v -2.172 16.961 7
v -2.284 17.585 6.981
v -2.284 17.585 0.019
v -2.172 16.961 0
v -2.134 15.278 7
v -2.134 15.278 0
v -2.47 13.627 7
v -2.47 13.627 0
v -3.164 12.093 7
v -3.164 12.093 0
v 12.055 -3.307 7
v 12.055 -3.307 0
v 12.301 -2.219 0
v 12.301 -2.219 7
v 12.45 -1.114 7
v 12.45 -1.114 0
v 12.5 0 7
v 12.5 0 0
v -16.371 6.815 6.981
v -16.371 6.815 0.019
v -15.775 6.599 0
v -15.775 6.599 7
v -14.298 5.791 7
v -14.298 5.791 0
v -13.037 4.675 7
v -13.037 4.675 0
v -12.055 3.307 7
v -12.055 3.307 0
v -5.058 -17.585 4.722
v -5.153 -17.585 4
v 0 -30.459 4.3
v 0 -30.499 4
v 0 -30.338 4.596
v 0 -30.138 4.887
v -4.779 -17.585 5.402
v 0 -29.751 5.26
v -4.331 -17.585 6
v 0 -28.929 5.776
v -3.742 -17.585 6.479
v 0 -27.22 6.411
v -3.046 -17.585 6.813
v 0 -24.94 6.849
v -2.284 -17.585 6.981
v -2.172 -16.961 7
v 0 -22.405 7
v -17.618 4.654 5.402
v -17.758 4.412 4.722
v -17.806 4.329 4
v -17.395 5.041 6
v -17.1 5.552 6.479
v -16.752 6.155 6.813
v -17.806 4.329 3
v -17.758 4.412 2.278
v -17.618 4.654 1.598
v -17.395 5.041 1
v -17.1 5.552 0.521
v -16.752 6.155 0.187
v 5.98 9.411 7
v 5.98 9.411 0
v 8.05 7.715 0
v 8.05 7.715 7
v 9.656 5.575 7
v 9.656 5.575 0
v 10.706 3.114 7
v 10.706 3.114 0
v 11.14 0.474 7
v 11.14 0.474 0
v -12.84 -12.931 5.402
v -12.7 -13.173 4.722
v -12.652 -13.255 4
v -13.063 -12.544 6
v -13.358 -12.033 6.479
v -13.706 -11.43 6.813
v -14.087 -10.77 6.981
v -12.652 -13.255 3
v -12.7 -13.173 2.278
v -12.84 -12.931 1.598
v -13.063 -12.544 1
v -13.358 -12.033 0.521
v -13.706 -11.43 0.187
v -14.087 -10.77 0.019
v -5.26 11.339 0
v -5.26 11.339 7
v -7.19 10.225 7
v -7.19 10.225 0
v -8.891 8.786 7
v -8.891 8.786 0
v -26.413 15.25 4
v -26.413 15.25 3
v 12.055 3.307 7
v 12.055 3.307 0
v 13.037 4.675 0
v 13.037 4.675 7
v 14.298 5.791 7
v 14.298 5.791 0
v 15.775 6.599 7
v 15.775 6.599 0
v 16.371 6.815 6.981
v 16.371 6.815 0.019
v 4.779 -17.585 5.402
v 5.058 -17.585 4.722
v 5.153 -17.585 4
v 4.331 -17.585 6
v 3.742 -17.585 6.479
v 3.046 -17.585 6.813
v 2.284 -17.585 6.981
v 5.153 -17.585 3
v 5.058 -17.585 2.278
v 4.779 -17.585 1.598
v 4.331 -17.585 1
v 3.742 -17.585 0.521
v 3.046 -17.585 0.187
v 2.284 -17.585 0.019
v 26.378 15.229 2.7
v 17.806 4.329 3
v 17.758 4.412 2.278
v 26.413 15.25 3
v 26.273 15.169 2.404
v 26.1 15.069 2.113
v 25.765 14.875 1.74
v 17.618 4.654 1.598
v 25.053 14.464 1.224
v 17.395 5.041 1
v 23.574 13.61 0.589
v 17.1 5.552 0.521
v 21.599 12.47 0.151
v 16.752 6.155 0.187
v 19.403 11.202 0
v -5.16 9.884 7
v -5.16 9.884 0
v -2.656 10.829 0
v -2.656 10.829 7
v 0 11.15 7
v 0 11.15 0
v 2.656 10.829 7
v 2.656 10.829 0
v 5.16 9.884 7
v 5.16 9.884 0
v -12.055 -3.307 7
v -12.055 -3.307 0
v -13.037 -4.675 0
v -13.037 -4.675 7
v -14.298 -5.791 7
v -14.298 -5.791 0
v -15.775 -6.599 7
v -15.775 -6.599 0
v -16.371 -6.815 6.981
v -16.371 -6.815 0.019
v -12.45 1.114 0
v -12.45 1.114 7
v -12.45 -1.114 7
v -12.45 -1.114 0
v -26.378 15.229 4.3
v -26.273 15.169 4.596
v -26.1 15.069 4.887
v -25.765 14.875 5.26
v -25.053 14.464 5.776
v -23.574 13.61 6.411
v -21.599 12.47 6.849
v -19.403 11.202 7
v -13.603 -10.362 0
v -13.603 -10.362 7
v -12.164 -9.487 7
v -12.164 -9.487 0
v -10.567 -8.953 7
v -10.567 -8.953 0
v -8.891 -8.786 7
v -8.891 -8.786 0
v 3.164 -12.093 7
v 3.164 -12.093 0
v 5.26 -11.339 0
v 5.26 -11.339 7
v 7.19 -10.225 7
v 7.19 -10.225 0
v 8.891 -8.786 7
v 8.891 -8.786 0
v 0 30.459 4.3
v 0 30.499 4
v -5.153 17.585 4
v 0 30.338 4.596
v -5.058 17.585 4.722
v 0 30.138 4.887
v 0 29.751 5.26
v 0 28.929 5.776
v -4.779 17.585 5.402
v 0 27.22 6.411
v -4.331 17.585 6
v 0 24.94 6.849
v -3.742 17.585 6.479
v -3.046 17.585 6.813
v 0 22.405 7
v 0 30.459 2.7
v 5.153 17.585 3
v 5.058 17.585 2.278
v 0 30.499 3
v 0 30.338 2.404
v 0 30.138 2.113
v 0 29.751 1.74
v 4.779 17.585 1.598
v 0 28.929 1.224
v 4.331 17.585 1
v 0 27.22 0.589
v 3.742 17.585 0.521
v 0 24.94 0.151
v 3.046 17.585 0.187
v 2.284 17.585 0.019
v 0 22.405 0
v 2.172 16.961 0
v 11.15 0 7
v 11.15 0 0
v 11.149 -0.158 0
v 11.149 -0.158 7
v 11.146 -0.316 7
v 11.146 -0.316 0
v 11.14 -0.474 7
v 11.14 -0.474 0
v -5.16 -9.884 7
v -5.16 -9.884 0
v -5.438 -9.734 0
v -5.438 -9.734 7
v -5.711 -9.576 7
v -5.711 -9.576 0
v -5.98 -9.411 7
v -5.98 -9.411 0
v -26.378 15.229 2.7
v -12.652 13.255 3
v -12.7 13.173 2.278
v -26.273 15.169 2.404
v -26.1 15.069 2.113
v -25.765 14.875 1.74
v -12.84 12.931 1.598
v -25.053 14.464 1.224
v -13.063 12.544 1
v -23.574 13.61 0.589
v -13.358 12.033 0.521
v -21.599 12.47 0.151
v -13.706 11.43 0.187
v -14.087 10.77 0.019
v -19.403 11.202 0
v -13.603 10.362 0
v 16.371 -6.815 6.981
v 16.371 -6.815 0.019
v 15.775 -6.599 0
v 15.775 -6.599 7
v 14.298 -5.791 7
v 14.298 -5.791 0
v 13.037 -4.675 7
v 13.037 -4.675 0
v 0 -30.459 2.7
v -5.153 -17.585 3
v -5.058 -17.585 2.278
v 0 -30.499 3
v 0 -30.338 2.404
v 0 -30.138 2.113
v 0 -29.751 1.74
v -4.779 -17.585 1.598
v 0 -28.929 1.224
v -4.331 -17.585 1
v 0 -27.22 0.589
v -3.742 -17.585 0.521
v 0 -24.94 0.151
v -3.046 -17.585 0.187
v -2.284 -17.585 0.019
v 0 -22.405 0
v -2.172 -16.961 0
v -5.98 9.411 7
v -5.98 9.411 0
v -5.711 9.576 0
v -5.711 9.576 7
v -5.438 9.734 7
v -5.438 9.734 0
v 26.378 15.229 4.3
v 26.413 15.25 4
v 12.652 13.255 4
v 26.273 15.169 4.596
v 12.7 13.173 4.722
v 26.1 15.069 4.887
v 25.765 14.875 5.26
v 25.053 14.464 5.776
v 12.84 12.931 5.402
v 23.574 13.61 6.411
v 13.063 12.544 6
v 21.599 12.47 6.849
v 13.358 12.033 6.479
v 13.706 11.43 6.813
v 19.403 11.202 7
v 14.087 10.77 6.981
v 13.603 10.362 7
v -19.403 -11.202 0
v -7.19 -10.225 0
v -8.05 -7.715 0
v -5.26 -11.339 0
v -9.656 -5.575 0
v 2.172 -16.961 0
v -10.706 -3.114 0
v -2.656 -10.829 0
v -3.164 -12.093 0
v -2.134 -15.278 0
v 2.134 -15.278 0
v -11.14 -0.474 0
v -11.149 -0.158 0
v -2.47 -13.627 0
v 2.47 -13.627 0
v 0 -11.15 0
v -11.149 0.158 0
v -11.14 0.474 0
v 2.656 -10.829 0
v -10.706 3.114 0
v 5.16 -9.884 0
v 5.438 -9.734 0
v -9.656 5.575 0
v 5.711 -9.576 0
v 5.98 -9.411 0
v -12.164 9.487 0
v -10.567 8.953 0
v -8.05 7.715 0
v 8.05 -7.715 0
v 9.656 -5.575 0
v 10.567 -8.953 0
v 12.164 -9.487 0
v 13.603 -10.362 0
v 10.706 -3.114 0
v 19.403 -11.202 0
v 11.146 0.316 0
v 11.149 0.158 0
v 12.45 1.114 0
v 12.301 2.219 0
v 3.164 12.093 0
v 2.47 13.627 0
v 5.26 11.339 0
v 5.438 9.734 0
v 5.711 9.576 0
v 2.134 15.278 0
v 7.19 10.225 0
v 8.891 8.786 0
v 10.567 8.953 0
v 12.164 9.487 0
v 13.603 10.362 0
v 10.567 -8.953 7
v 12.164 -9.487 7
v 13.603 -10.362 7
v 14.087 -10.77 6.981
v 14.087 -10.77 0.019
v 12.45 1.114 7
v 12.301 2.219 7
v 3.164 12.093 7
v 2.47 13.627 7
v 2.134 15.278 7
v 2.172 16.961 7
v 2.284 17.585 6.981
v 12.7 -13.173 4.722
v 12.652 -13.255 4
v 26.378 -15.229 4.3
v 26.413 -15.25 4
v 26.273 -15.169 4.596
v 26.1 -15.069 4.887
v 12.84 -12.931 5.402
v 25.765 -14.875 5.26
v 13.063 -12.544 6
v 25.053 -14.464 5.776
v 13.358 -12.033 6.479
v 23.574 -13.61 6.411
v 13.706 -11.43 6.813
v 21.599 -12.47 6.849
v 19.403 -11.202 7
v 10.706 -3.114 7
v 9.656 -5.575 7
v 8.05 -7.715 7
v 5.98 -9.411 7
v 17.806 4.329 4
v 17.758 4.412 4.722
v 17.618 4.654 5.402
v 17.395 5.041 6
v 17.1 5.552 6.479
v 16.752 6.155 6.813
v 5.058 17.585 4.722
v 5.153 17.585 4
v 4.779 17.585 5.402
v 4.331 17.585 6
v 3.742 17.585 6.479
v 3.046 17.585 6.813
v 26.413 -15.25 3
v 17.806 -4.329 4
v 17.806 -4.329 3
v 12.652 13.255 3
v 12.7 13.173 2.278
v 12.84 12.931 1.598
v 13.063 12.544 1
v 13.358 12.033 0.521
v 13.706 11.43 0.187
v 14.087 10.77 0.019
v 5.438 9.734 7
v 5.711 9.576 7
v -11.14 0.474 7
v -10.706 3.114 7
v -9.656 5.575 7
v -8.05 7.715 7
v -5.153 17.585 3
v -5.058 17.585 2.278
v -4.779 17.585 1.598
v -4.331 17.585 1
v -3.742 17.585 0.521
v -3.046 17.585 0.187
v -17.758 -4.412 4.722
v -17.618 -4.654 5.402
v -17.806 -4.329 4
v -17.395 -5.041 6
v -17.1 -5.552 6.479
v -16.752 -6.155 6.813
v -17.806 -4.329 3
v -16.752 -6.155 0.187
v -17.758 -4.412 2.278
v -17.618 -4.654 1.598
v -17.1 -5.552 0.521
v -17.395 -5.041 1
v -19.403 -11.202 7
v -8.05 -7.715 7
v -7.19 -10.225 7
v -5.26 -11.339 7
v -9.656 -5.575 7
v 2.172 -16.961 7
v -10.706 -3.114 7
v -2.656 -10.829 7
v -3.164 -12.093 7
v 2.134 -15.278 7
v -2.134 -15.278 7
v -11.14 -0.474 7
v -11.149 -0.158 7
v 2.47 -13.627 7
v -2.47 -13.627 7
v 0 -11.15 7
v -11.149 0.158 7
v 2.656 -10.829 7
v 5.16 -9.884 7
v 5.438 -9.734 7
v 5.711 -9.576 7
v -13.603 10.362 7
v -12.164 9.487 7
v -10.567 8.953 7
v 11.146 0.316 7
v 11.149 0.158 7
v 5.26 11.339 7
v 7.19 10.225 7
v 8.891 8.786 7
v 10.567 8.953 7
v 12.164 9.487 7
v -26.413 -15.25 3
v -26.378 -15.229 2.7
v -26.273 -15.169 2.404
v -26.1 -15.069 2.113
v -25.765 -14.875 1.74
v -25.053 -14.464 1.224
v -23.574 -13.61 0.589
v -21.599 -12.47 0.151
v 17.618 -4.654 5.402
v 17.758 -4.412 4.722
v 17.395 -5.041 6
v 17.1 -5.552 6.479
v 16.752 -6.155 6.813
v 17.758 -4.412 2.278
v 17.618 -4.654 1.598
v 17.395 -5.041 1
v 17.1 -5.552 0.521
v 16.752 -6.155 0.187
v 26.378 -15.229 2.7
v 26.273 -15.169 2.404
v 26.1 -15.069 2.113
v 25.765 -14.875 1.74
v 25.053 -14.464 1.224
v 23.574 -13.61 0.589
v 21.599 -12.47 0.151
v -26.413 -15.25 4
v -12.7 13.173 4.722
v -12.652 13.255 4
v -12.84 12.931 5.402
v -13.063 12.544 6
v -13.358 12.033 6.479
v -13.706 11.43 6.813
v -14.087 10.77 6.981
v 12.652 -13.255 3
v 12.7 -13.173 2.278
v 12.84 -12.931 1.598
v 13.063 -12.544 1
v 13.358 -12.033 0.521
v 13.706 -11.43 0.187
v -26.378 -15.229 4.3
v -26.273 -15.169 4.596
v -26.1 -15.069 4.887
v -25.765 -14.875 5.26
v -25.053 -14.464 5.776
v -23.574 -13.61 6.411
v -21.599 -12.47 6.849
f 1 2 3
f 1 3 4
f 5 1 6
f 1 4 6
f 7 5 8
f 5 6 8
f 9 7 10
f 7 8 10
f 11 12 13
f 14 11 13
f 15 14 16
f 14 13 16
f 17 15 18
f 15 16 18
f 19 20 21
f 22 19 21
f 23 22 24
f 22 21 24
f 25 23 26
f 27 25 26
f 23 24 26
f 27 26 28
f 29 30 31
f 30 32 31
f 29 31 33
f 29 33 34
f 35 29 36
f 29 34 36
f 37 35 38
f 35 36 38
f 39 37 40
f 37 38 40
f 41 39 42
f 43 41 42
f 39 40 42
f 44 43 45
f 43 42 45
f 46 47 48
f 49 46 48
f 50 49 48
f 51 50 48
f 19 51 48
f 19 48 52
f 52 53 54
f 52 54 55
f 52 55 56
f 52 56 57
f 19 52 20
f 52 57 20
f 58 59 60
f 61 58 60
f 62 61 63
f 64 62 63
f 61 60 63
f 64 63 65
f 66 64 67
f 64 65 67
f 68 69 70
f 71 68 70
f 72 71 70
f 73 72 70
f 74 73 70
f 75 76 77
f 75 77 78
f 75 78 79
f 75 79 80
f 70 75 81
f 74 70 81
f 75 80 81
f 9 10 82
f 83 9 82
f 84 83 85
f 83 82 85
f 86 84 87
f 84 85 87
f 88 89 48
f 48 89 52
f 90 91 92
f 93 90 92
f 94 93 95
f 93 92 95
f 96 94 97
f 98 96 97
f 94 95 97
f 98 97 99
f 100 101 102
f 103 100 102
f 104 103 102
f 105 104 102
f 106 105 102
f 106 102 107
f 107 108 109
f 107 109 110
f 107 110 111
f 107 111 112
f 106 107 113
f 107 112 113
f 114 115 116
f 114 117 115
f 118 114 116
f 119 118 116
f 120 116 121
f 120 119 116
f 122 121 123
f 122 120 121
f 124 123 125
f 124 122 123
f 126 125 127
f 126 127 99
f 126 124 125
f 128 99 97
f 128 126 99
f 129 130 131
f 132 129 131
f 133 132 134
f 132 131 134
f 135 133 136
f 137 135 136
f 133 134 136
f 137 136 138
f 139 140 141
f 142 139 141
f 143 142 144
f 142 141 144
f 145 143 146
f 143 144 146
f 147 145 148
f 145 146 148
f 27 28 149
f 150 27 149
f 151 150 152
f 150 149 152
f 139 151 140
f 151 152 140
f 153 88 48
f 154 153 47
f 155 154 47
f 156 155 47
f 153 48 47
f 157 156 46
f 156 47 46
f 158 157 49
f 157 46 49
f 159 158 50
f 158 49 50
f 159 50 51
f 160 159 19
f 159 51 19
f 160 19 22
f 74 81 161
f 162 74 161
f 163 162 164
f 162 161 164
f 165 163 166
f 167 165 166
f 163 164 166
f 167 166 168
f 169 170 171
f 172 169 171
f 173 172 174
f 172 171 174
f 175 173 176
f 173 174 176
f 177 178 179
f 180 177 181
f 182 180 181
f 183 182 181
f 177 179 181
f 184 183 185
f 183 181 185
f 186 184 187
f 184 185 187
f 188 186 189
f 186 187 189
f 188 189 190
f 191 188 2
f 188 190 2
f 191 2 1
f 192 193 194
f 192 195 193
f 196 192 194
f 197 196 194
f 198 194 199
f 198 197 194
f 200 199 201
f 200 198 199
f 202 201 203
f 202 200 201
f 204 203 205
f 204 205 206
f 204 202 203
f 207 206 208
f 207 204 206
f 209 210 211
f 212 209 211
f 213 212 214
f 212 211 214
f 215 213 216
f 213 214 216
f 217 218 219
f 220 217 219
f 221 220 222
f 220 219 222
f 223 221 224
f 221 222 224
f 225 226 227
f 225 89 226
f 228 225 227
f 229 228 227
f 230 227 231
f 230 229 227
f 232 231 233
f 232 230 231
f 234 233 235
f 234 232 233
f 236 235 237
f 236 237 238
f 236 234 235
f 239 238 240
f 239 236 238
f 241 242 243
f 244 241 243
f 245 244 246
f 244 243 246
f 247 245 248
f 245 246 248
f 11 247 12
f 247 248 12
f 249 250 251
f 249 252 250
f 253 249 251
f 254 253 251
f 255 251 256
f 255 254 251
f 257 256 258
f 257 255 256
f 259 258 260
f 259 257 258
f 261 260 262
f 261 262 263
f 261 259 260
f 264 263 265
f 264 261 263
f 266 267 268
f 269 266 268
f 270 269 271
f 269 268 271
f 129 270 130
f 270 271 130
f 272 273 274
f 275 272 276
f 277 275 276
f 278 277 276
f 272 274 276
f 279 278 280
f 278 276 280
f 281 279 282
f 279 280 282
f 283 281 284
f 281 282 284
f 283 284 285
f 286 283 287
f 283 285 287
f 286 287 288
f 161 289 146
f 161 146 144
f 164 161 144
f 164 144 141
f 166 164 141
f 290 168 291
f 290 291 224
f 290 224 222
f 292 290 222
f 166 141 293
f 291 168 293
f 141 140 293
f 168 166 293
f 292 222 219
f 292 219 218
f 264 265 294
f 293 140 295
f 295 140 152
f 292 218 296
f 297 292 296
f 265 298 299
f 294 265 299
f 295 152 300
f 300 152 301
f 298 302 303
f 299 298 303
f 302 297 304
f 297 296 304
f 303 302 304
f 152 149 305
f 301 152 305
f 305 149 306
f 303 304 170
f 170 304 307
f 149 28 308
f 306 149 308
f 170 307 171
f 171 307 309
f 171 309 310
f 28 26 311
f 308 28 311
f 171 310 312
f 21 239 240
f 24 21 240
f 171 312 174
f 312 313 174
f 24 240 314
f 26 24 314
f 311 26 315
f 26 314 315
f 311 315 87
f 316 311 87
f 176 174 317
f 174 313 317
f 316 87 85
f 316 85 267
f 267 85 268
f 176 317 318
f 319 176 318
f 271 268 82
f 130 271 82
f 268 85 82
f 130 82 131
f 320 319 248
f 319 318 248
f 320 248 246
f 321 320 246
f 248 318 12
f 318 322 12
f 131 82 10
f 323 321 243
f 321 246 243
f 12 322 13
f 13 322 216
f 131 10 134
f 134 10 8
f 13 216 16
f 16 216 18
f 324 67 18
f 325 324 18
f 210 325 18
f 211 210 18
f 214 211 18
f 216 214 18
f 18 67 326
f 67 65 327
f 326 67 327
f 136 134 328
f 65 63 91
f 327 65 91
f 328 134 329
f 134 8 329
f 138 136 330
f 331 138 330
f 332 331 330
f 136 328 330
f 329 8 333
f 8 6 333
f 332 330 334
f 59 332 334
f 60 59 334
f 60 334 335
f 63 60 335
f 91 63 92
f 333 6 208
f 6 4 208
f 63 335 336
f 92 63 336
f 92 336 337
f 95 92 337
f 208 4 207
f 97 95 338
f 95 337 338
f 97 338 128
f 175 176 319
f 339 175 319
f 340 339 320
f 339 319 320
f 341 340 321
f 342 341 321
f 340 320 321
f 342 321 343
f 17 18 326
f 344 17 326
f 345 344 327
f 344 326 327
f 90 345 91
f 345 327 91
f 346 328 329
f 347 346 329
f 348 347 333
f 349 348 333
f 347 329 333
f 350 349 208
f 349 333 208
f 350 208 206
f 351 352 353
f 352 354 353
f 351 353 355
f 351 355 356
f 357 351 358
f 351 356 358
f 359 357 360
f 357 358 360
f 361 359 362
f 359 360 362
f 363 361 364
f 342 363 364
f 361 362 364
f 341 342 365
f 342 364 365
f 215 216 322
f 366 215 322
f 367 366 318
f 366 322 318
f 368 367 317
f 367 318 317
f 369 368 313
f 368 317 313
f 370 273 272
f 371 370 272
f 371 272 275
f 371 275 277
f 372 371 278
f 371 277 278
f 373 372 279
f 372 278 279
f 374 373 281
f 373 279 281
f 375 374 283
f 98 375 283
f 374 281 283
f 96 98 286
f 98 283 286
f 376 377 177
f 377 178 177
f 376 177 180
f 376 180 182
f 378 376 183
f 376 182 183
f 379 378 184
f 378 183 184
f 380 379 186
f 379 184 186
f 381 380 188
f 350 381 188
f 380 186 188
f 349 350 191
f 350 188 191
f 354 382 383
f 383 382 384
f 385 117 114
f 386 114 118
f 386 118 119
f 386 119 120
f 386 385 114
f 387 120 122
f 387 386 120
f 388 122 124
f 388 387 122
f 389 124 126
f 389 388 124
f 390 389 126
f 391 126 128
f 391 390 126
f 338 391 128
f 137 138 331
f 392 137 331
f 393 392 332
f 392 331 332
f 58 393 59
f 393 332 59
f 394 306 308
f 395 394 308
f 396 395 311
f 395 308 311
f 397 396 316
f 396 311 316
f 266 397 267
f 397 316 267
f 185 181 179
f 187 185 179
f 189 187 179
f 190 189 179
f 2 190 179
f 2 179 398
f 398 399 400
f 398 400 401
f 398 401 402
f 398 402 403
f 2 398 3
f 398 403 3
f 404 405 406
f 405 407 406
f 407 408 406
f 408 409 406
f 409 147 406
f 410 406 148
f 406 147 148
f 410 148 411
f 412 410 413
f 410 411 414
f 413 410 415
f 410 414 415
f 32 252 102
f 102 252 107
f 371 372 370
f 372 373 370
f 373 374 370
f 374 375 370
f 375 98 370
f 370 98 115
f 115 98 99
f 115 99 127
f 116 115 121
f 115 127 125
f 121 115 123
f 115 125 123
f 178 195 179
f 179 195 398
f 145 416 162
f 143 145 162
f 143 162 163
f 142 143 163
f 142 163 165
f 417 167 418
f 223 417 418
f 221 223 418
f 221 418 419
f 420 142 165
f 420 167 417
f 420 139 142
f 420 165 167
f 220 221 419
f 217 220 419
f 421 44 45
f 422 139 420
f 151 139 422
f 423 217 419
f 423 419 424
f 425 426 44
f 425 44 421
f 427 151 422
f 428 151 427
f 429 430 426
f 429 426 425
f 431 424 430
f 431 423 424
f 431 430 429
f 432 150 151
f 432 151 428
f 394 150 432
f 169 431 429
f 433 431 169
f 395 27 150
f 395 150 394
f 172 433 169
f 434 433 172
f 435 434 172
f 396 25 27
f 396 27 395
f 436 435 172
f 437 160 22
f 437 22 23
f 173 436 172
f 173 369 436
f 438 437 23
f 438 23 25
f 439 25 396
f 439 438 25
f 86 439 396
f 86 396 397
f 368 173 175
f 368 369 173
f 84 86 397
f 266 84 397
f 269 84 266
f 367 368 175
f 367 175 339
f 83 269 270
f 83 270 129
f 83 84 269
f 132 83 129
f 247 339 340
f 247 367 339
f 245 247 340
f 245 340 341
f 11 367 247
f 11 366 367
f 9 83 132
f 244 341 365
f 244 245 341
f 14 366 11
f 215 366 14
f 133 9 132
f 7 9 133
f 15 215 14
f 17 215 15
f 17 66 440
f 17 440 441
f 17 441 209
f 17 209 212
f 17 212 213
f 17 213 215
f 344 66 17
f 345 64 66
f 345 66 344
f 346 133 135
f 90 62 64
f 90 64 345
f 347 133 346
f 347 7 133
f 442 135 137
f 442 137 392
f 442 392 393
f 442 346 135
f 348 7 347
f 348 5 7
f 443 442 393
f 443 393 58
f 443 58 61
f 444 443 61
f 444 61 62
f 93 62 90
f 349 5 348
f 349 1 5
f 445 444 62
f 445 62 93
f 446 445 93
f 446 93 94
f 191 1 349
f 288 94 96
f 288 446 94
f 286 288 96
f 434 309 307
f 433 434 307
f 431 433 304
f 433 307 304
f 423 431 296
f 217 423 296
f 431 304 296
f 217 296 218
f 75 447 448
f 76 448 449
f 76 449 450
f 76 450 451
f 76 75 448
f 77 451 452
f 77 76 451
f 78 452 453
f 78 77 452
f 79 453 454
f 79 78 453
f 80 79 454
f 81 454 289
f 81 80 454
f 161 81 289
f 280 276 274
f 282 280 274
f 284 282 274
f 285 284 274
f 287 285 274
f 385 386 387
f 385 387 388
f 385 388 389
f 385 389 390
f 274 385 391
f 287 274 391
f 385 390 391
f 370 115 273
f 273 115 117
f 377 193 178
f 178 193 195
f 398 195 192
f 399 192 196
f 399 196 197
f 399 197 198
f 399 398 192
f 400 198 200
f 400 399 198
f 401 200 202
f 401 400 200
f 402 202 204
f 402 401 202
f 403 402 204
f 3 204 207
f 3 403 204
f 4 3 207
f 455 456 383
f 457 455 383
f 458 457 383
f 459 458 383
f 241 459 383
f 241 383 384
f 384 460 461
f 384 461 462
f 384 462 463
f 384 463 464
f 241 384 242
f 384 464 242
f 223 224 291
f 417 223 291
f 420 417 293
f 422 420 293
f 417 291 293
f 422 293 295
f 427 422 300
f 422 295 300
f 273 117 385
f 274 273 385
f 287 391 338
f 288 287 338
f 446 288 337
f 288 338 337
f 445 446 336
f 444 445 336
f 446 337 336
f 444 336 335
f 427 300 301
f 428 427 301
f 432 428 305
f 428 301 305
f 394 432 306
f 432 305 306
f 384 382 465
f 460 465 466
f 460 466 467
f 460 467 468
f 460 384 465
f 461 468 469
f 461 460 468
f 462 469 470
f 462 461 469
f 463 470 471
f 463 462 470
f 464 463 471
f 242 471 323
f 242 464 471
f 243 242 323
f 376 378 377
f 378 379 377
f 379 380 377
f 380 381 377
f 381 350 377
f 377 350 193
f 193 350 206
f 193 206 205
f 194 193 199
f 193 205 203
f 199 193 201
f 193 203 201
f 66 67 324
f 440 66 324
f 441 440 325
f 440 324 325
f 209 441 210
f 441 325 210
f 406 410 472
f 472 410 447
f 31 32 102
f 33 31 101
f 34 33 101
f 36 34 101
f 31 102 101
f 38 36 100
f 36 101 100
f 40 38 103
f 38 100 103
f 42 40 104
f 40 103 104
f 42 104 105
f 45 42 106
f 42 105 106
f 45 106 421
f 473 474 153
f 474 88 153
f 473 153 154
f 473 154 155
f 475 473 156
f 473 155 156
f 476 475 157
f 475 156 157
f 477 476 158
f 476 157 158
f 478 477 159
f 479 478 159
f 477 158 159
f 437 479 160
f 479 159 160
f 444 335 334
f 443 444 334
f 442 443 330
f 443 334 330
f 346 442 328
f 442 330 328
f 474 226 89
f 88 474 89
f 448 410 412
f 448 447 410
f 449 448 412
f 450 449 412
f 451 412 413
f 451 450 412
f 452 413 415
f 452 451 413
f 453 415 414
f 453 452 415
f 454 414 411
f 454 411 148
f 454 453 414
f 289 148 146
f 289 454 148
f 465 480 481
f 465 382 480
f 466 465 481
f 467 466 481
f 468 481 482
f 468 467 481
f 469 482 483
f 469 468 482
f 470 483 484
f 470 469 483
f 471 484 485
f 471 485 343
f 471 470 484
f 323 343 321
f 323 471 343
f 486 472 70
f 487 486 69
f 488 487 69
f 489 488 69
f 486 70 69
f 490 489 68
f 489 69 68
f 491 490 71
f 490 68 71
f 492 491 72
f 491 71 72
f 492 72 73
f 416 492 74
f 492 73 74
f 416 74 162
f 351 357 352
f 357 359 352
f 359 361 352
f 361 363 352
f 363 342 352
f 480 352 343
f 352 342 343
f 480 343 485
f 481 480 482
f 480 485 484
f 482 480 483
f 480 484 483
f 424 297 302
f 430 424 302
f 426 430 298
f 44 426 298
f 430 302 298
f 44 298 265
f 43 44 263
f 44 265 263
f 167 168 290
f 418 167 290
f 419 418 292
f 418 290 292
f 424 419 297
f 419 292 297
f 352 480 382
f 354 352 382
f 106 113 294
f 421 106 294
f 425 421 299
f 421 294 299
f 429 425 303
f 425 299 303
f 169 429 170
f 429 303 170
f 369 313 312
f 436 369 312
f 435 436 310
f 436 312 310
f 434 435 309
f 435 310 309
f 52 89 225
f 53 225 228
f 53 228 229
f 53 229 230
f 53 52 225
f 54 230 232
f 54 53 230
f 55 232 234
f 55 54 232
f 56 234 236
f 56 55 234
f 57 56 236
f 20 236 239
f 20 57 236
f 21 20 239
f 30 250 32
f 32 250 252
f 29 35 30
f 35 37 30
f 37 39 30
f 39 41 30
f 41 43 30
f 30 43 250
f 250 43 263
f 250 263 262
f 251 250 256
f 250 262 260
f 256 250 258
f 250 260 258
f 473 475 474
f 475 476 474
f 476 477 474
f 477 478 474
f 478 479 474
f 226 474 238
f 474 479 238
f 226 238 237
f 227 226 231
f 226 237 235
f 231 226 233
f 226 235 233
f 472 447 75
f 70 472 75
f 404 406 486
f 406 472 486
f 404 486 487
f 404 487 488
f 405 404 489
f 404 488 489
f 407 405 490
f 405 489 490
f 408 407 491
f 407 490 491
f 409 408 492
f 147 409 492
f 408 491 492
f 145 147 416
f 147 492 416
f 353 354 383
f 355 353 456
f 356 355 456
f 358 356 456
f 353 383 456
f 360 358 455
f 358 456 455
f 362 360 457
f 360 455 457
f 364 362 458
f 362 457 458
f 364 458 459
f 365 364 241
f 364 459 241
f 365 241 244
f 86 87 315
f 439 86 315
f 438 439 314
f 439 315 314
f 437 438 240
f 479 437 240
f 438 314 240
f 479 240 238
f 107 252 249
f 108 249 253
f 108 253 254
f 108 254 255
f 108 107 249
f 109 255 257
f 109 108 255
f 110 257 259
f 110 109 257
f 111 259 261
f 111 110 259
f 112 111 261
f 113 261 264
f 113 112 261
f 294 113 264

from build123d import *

# Parameters (mm, degrees)
F1_DEPTH = 7
F2_R     = 3


with BuildPart() as f1:
    # F0 (on Top) → F1 (new body)
    with BuildSketch(Plane.XY):
        with BuildLine():
            ThreePointArc((11.139936974, 0.4736076595), (11.1474839596, 0.2368572775), (11.15, 0))
            ThreePointArc((11.15, 0), (11.1474839596, -0.2368572775), (11.139936974, -0.4736076595))
            ThreePointArc((11.139936974, -0.4736076595), (11.4562515521, -1.9356574125), (12.0547261732, -3.306595967))
            ThreePointArc((12.0547261732, -3.306595967), (12.3881814074, -1.6682210338), (12.5, 0))
            ThreePointArc((12.5, 0), (12.3881814074, 1.6682210338), (12.0547261732, 3.306595967))
            ThreePointArc((12.0547261732, 3.306595967), (11.4562515521, 1.9356574125), (11.139936974, 0.4736076595))
        make_face()
        with BuildLine():
            ThreePointArc((5.9801247516, 9.4106645863), (9.6561832522, 5.575), (11.139936974, 0.4736076595))
            ThreePointArc((11.139936974, 0.4736076595), (11.4562515521, 1.9356574125), (12.0547261732, 3.306595967))
            ThreePointArc((12.0547261732, 3.306595967), (10.8253175473, 6.25), (8.8909591941, 8.7864011181))
            ThreePointArc((8.8909591941, 8.7864011181), (7.4044542683, 8.9535761701), (5.9801247516, 9.4106645863))
        make_face()
        with BuildLine():
            ThreePointArc((12.0547261732, -3.306595967), (11.4562515521, -1.9356574125), (11.139936974, -0.4736076595))
            ThreePointArc((11.139936974, -0.4736076595), (9.6561832522, -5.575), (5.9801247516, -9.4106645863))
            ThreePointArc((5.9801247516, -9.4106645863), (7.4044542683, -8.9535761701), (8.8909591941, -8.7864011181))
            ThreePointArc((8.8909591941, -8.7864011181), (10.8253175473, -6.25), (12.0547261732, -3.306595967))
        make_face()
        with BuildLine():
            ThreePointArc((5.1598122224, 9.8842722458), (5.575, 9.6561832522), (5.9801247516, 9.4106645863))
            ThreePointArc((5.9801247516, 9.4106645863), (7.4044542683, 8.9535761701), (8.8909591941, 8.7864011181))
            ThreePointArc((8.8909591941, 8.7864011181), (6.25, 10.8253175473), (3.1637669791, 12.0929970852))
            ThreePointArc((3.1637669791, 12.0929970852), (4.0517972839, 10.8892335825), (5.1598122224, 9.8842722458))
        make_face()
        with BuildLine():
            ThreePointArc((8.8909591941, 8.7864011181), (10.8253175473, 6.25), (12.0547261732, 3.306595967))
            ThreePointArc((12.0547261732, 3.306595967), (13.8777539277, 5.4728270333), (16.3707526215, 6.8148198569))
            Line((16.3707526215, 6.8148198569), (17.8056945141, 4.3294275931))
            Line((17.8056945141, 4.3294275931), (26.4132363375, 15.2496891096))
            Line((26.4132363375, 15.2496891096), (12.6522415365, 13.2554699846))
            Line((12.6522415365, 13.2554699846), (14.087183429, 10.7700777209))
            ThreePointArc((14.087183429, 10.7700777209), (11.6784842052, 9.2820739322), (8.8909591941, 8.7864011181))
        make_face()
        with BuildLine():
            ThreePointArc((8.8909591941, -8.7864011181), (7.4044542683, -8.9535761701), (5.9801247516, -9.4106645863))
            ThreePointArc((5.9801247516, -9.4106645863), (5.575, -9.6561832522), (5.1598122224, -9.8842722458))
            ThreePointArc((5.1598122224, -9.8842722458), (4.0517972839, -10.8892335825), (3.1637669791, -12.0929970852))
            ThreePointArc((3.1637669791, -12.0929970852), (6.25, -10.8253175473), (8.8909591941, -8.7864011181))
        make_face()
        with BuildLine():
            ThreePointArc((16.3707526215, -6.8148198569), (13.8777539277, -5.4728270333), (12.0547261732, -3.306595967))
            ThreePointArc((12.0547261732, -3.306595967), (10.8253175473, -6.25), (8.8909591941, -8.7864011181))
            ThreePointArc((8.8909591941, -8.7864011181), (11.6784842052, -9.2820739322), (14.087183429, -10.7700777209))
            Line((14.087183429, -10.7700777209), (12.6522415365, -13.2554699846))
            Line((12.6522415365, -13.2554699846), (26.4132363375, -15.2496891096))
            Line((26.4132363375, -15.2496891096), (17.8056945141, -4.3294275931))
            Line((17.8056945141, -4.3294275931), (16.3707526215, -6.8148198569))
        make_face()
        with BuildLine():
            ThreePointArc((-5.1598122224, 9.8842722458), (0, 11.15), (5.1598122224, 9.8842722458))
            ThreePointArc((5.1598122224, 9.8842722458), (4.0517972839, 10.8892335825), (3.1637669791, 12.0929970852))
            ThreePointArc((3.1637669791, 12.0929970852), (0, 12.5), (-3.1637669791, 12.0929970852))
            ThreePointArc((-3.1637669791, 12.0929970852), (-4.0517972839, 10.8892335825), (-5.1598122224, 9.8842722458))
        make_face()
        with BuildLine():
            ThreePointArc((3.1637669791, -12.0929970852), (4.0517972839, -10.8892335825), (5.1598122224, -9.8842722458))
            ThreePointArc((5.1598122224, -9.8842722458), (0, -11.15), (-5.1598122224, -9.8842722458))
            ThreePointArc((-5.1598122224, -9.8842722458), (-4.0517972839, -10.8892335825), (-3.1637669791, -12.0929970852))
            ThreePointArc((-3.1637669791, -12.0929970852), (0, -12.5), (3.1637669791, -12.0929970852))
        make_face()
        with BuildLine():
            ThreePointArc((-5.9801247516, 9.4106645863), (-5.575, 9.6561832522), (-5.1598122224, 9.8842722458))
            ThreePointArc((-5.1598122224, 9.8842722458), (-4.0517972839, 10.8892335825), (-3.1637669791, 12.0929970852))
            ThreePointArc((-3.1637669791, 12.0929970852), (-6.25, 10.8253175473), (-8.8909591941, 8.7864011181))
            ThreePointArc((-8.8909591941, 8.7864011181), (-7.4044542683, 8.9535761701), (-5.9801247516, 9.4106645863))
        make_face()
        with BuildLine():
            ThreePointArc((-3.1637669791, 12.0929970852), (0, 12.5), (3.1637669791, 12.0929970852))
            ThreePointArc((3.1637669791, 12.0929970852), (2.1992697225, 14.7549009655), (2.2835691925, 17.5848975778))
            Line((2.2835691925, 17.5848975778), (5.1534529775, 17.5848975778))
            Line((5.1534529775, 17.5848975778), (0, 30.4993782192))
            Line((0, 30.4993782192), (-5.1534529775, 17.5848975778))
            Line((-5.1534529775, 17.5848975778), (-2.2835691925, 17.5848975778))
            ThreePointArc((-2.2835691925, 17.5848975778), (-2.1992697225, 14.7549009655), (-3.1637669791, 12.0929970852))
        make_face()
        with BuildLine():
            ThreePointArc((-3.1637669791, -12.0929970852), (-4.0517972839, -10.8892335825), (-5.1598122224, -9.8842722458))
            ThreePointArc((-5.1598122224, -9.8842722458), (-5.575, -9.6561832522), (-5.9801247516, -9.4106645863))
            ThreePointArc((-5.9801247516, -9.4106645863), (-7.4044542683, -8.9535761701), (-8.8909591941, -8.7864011181))
            ThreePointArc((-8.8909591941, -8.7864011181), (-6.25, -10.8253175473), (-3.1637669791, -12.0929970852))
        make_face()
        with BuildLine():
            ThreePointArc((2.2835691925, -17.5848975778), (2.1992697225, -14.7549009655), (3.1637669791, -12.0929970852))
            ThreePointArc((3.1637669791, -12.0929970852), (0, -12.5), (-3.1637669791, -12.0929970852))
            ThreePointArc((-3.1637669791, -12.0929970852), (-2.1992697225, -14.7549009655), (-2.2835691925, -17.5848975778))
            Line((-2.2835691925, -17.5848975778), (-5.1534529775, -17.5848975778))
            Line((-5.1534529775, -17.5848975778), (0, -30.4993782192))
            Line((0, -30.4993782192), (5.1534529775, -17.5848975778))
            Line((5.1534529775, -17.5848975778), (2.2835691925, -17.5848975778))
        make_face()
        with BuildLine():
            ThreePointArc((-11.139936974, 0.4736076595), (-9.6561832522, 5.575), (-5.9801247516, 9.4106645863))
            ThreePointArc((-5.9801247516, 9.4106645863), (-7.4044542683, 8.9535761701), (-8.8909591941, 8.7864011181))
            ThreePointArc((-8.8909591941, 8.7864011181), (-10.8253175473, 6.25), (-12.0547261732, 3.306595967))
            ThreePointArc((-12.0547261732, 3.306595967), (-11.4562515521, 1.9356574125), (-11.139936974, 0.4736076595))
        make_face()
        with BuildLine():
            ThreePointArc((-8.8909591941, -8.7864011181), (-7.4044542683, -8.9535761701), (-5.9801247516, -9.4106645863))
            ThreePointArc((-5.9801247516, -9.4106645863), (-9.6561832522, -5.575), (-11.139936974, -0.4736076595))
            ThreePointArc((-11.139936974, -0.4736076595), (-11.4562515521, -1.9356574125), (-12.0547261732, -3.306595967))
            ThreePointArc((-12.0547261732, -3.306595967), (-10.8253175473, -6.25), (-8.8909591941, -8.7864011181))
        make_face()
        with BuildLine():
            ThreePointArc((-11.139936974, -0.4736076595), (-11.15, 0), (-11.139936974, 0.4736076595))
            ThreePointArc((-11.139936974, 0.4736076595), (-11.4562515521, 1.9356574125), (-12.0547261732, 3.306595967))
            ThreePointArc((-12.0547261732, 3.306595967), (-12.5, 0), (-12.0547261732, -3.306595967))
            ThreePointArc((-12.0547261732, -3.306595967), (-11.4562515521, -1.9356574125), (-11.139936974, -0.4736076595))
        make_face()
        with BuildLine():
            ThreePointArc((-12.0547261732, 3.306595967), (-10.8253175473, 6.25), (-8.8909591941, 8.7864011181))
            ThreePointArc((-8.8909591941, 8.7864011181), (-11.6784842052, 9.2820739322), (-14.087183429, 10.7700777209))
            Line((-14.087183429, 10.7700777209), (-12.6522415365, 13.2554699846))
            Line((-12.6522415365, 13.2554699846), (-26.4132363375, 15.2496891096))
            Line((-26.4132363375, 15.2496891096), (-17.8056945141, 4.3294275931))
            Line((-17.8056945141, 4.3294275931), (-16.3707526215, 6.8148198569))
            ThreePointArc((-16.3707526215, 6.8148198569), (-13.8777539277, 5.4728270333), (-12.0547261732, 3.306595967))
        make_face()
        with BuildLine():
            ThreePointArc((-14.087183429, -10.7700777209), (-11.6784842052, -9.2820739322), (-8.8909591941, -8.7864011181))
            ThreePointArc((-8.8909591941, -8.7864011181), (-10.8253175473, -6.25), (-12.0547261732, -3.306595967))
            ThreePointArc((-12.0547261732, -3.306595967), (-13.8777539277, -5.4728270333), (-16.3707526215, -6.8148198569))
            Line((-16.3707526215, -6.8148198569), (-17.8056945141, -4.3294275931))
            Line((-17.8056945141, -4.3294275931), (-26.4132363375, -15.2496891096))
            Line((-26.4132363375, -15.2496891096), (-12.6522415365, -13.2554699846))
            Line((-12.6522415365, -13.2554699846), (-14.087183429, -10.7700777209))
        make_face()
    extrude(amount=F1_DEPTH)

    # F2
    f2_edges = [f1.edges().sort_by_distance(p)[0] for p in [
        (-19.532739, -14.25258, 0),
        (-22.109465, -9.789558, 0),
        (-22.109465, 9.789558, 0),
        (-19.532739, 14.25258, 0),
        (-2.576726, 24.042138, 0),
        (19.532739, 14.25258, 0),
        (22.109465, 9.789558, 0),
        (22.109465, -9.789558, 0),
        (19.532739, -14.25258, 0),
        (-2.576726, -24.042138, 0),
        (2.576726, -24.042138, 0),
        (2.576726, 24.042138, 0),
        (-19.532739, 14.25258, 7),
        (-22.109465, 9.789558, 7),
        (-2.576726, 24.042138, 7),
        (2.576726, 24.042138, 7),
        (22.109465, 9.789558, 7),
        (22.109465, -9.789558, 7),
        (19.532739, -14.25258, 7),
        (2.576726, -24.042138, 7),
        (-2.576726, -24.042138, 7),
        (-22.109465, -9.789558, 7),
        (-19.532739, -14.25258, 7),
        (19.532739, 14.25258, 7),
    ]]
    fillet(f2_edges, radius=F2_R)


solid = f1.part
